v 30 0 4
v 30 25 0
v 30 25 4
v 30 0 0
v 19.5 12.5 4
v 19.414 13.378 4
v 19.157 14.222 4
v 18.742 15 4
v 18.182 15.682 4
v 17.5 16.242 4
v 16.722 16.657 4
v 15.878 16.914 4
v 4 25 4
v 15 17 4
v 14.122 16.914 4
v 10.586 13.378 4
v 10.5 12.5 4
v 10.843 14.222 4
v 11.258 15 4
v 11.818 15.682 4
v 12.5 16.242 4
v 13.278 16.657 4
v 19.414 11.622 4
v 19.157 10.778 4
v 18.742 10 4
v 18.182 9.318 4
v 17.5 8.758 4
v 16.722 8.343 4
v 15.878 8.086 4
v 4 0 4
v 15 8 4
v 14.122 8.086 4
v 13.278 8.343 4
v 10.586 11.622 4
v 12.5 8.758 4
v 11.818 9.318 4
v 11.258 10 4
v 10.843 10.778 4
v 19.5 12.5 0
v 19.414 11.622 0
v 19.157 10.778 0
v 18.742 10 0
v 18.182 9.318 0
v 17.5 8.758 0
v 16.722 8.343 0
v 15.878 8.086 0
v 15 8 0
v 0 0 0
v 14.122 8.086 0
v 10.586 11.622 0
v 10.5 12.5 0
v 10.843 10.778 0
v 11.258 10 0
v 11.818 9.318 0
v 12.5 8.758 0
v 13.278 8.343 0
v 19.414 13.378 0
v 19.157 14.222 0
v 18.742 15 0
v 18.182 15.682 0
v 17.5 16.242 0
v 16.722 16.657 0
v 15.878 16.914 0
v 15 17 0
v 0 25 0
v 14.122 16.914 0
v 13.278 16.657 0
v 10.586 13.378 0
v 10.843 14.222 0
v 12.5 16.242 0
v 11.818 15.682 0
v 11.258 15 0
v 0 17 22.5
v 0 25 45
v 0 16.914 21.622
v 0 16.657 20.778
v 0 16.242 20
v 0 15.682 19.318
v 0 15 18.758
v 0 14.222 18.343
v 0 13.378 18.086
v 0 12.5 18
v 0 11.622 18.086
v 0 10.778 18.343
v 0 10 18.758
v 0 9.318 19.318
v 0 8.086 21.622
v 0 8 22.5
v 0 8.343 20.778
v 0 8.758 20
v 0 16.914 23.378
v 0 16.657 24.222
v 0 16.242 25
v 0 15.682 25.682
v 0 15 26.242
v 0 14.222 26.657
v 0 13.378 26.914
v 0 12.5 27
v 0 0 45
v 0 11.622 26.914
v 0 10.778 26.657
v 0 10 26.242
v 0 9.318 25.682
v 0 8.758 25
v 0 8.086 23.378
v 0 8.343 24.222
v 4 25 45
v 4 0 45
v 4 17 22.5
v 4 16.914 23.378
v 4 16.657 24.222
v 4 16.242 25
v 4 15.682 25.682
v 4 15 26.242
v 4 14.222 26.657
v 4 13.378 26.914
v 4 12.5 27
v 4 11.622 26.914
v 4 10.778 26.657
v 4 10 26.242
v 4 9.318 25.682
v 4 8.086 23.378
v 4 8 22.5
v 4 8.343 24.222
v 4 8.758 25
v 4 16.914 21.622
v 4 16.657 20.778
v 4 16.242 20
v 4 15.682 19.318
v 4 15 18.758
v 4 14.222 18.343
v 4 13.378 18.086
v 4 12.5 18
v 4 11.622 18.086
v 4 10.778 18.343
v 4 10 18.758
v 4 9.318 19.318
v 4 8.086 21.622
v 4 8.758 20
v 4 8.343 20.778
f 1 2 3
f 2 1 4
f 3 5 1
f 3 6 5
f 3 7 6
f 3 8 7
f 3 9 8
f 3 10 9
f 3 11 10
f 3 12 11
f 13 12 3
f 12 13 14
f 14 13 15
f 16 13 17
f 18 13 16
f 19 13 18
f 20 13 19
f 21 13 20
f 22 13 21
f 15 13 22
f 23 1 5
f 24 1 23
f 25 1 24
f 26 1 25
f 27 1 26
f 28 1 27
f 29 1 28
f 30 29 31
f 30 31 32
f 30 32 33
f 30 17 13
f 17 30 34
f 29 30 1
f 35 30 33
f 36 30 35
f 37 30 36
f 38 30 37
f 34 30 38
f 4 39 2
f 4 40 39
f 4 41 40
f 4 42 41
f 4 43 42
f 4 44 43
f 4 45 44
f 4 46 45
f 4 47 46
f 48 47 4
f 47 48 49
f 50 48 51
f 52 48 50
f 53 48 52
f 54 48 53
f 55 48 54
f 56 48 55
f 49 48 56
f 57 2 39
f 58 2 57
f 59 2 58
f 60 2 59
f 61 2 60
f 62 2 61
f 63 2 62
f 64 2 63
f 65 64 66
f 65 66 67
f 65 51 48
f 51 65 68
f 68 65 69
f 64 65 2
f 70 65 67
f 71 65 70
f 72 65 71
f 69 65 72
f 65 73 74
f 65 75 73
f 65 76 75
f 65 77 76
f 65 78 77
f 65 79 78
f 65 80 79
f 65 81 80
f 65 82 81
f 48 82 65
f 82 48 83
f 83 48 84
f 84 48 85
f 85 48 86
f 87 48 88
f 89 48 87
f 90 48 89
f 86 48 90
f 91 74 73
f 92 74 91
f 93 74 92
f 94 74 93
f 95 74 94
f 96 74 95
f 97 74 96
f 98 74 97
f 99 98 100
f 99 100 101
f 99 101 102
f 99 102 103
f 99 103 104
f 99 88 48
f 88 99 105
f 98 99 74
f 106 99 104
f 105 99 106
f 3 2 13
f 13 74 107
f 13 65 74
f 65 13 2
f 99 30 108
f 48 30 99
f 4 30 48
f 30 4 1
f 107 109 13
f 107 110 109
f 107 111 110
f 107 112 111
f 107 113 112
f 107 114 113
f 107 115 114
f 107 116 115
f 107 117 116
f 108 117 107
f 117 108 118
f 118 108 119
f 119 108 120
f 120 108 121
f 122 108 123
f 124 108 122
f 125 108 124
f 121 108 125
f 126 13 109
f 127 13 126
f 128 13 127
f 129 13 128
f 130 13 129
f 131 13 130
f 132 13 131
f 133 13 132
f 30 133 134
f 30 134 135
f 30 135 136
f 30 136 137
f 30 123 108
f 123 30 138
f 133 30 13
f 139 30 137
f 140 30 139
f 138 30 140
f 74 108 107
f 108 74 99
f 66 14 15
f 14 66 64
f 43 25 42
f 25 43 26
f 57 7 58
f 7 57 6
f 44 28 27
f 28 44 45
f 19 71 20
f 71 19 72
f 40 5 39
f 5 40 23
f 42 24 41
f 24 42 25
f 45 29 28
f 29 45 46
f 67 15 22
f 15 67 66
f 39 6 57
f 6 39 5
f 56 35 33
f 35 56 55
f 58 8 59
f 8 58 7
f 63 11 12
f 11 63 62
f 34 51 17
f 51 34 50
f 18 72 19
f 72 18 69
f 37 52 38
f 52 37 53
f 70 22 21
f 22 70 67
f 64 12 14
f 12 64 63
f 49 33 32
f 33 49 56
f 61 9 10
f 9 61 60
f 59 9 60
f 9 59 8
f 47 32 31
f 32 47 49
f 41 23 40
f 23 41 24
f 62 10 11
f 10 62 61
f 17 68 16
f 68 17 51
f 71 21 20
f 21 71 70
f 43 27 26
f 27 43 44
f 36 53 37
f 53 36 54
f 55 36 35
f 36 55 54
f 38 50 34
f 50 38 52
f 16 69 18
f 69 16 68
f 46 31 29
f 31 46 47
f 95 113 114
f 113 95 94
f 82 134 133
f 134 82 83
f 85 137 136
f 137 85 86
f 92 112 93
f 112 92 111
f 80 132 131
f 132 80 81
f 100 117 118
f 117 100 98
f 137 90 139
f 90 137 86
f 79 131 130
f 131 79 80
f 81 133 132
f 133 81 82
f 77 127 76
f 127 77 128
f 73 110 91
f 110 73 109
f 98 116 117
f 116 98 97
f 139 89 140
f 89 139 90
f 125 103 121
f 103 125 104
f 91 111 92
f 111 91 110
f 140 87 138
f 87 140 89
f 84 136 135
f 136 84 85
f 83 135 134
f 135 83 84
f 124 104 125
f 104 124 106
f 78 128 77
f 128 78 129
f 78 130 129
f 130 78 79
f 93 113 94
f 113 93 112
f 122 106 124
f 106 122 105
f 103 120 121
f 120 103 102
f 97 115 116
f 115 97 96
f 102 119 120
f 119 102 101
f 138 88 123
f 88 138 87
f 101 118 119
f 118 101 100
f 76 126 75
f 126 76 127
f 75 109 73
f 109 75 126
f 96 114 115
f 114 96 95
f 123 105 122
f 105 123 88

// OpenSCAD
$fn = 32;

// ----------------------------------------------------------------------
// L-bracket: 30 x 25 x 45 mm
// ----------------------------------------------------------------------

// --- parameters (mm) ---
base_len = 30;            // horizontal leg, X
upright_h = 45;           // vertical leg, Z
flange_w = 25;            // bracket depth, Y
mat_t = 4;                // plate thickness
hole_d = 9;               // clearance for M8

module hole_z(px, py) {
  translate([px, py, -2.5]) cylinder(h = mat_t + 5, d = hole_d);
}
module hole_x(pz, py) {
  translate([-2.5, py, pz]) rotate([0, 90, 0]) cylinder(h = mat_t + 5, d = hole_d);
}

difference() {
  union() {
    /* horizontal leg */
    cube([base_len, flange_w, mat_t]);
    /* vertical leg, overlapping the corner block */
    cube([mat_t, flange_w, upright_h]);
  }
  hole_z(15, 12.5);
  hole_x(22.5, 12.5);
}
